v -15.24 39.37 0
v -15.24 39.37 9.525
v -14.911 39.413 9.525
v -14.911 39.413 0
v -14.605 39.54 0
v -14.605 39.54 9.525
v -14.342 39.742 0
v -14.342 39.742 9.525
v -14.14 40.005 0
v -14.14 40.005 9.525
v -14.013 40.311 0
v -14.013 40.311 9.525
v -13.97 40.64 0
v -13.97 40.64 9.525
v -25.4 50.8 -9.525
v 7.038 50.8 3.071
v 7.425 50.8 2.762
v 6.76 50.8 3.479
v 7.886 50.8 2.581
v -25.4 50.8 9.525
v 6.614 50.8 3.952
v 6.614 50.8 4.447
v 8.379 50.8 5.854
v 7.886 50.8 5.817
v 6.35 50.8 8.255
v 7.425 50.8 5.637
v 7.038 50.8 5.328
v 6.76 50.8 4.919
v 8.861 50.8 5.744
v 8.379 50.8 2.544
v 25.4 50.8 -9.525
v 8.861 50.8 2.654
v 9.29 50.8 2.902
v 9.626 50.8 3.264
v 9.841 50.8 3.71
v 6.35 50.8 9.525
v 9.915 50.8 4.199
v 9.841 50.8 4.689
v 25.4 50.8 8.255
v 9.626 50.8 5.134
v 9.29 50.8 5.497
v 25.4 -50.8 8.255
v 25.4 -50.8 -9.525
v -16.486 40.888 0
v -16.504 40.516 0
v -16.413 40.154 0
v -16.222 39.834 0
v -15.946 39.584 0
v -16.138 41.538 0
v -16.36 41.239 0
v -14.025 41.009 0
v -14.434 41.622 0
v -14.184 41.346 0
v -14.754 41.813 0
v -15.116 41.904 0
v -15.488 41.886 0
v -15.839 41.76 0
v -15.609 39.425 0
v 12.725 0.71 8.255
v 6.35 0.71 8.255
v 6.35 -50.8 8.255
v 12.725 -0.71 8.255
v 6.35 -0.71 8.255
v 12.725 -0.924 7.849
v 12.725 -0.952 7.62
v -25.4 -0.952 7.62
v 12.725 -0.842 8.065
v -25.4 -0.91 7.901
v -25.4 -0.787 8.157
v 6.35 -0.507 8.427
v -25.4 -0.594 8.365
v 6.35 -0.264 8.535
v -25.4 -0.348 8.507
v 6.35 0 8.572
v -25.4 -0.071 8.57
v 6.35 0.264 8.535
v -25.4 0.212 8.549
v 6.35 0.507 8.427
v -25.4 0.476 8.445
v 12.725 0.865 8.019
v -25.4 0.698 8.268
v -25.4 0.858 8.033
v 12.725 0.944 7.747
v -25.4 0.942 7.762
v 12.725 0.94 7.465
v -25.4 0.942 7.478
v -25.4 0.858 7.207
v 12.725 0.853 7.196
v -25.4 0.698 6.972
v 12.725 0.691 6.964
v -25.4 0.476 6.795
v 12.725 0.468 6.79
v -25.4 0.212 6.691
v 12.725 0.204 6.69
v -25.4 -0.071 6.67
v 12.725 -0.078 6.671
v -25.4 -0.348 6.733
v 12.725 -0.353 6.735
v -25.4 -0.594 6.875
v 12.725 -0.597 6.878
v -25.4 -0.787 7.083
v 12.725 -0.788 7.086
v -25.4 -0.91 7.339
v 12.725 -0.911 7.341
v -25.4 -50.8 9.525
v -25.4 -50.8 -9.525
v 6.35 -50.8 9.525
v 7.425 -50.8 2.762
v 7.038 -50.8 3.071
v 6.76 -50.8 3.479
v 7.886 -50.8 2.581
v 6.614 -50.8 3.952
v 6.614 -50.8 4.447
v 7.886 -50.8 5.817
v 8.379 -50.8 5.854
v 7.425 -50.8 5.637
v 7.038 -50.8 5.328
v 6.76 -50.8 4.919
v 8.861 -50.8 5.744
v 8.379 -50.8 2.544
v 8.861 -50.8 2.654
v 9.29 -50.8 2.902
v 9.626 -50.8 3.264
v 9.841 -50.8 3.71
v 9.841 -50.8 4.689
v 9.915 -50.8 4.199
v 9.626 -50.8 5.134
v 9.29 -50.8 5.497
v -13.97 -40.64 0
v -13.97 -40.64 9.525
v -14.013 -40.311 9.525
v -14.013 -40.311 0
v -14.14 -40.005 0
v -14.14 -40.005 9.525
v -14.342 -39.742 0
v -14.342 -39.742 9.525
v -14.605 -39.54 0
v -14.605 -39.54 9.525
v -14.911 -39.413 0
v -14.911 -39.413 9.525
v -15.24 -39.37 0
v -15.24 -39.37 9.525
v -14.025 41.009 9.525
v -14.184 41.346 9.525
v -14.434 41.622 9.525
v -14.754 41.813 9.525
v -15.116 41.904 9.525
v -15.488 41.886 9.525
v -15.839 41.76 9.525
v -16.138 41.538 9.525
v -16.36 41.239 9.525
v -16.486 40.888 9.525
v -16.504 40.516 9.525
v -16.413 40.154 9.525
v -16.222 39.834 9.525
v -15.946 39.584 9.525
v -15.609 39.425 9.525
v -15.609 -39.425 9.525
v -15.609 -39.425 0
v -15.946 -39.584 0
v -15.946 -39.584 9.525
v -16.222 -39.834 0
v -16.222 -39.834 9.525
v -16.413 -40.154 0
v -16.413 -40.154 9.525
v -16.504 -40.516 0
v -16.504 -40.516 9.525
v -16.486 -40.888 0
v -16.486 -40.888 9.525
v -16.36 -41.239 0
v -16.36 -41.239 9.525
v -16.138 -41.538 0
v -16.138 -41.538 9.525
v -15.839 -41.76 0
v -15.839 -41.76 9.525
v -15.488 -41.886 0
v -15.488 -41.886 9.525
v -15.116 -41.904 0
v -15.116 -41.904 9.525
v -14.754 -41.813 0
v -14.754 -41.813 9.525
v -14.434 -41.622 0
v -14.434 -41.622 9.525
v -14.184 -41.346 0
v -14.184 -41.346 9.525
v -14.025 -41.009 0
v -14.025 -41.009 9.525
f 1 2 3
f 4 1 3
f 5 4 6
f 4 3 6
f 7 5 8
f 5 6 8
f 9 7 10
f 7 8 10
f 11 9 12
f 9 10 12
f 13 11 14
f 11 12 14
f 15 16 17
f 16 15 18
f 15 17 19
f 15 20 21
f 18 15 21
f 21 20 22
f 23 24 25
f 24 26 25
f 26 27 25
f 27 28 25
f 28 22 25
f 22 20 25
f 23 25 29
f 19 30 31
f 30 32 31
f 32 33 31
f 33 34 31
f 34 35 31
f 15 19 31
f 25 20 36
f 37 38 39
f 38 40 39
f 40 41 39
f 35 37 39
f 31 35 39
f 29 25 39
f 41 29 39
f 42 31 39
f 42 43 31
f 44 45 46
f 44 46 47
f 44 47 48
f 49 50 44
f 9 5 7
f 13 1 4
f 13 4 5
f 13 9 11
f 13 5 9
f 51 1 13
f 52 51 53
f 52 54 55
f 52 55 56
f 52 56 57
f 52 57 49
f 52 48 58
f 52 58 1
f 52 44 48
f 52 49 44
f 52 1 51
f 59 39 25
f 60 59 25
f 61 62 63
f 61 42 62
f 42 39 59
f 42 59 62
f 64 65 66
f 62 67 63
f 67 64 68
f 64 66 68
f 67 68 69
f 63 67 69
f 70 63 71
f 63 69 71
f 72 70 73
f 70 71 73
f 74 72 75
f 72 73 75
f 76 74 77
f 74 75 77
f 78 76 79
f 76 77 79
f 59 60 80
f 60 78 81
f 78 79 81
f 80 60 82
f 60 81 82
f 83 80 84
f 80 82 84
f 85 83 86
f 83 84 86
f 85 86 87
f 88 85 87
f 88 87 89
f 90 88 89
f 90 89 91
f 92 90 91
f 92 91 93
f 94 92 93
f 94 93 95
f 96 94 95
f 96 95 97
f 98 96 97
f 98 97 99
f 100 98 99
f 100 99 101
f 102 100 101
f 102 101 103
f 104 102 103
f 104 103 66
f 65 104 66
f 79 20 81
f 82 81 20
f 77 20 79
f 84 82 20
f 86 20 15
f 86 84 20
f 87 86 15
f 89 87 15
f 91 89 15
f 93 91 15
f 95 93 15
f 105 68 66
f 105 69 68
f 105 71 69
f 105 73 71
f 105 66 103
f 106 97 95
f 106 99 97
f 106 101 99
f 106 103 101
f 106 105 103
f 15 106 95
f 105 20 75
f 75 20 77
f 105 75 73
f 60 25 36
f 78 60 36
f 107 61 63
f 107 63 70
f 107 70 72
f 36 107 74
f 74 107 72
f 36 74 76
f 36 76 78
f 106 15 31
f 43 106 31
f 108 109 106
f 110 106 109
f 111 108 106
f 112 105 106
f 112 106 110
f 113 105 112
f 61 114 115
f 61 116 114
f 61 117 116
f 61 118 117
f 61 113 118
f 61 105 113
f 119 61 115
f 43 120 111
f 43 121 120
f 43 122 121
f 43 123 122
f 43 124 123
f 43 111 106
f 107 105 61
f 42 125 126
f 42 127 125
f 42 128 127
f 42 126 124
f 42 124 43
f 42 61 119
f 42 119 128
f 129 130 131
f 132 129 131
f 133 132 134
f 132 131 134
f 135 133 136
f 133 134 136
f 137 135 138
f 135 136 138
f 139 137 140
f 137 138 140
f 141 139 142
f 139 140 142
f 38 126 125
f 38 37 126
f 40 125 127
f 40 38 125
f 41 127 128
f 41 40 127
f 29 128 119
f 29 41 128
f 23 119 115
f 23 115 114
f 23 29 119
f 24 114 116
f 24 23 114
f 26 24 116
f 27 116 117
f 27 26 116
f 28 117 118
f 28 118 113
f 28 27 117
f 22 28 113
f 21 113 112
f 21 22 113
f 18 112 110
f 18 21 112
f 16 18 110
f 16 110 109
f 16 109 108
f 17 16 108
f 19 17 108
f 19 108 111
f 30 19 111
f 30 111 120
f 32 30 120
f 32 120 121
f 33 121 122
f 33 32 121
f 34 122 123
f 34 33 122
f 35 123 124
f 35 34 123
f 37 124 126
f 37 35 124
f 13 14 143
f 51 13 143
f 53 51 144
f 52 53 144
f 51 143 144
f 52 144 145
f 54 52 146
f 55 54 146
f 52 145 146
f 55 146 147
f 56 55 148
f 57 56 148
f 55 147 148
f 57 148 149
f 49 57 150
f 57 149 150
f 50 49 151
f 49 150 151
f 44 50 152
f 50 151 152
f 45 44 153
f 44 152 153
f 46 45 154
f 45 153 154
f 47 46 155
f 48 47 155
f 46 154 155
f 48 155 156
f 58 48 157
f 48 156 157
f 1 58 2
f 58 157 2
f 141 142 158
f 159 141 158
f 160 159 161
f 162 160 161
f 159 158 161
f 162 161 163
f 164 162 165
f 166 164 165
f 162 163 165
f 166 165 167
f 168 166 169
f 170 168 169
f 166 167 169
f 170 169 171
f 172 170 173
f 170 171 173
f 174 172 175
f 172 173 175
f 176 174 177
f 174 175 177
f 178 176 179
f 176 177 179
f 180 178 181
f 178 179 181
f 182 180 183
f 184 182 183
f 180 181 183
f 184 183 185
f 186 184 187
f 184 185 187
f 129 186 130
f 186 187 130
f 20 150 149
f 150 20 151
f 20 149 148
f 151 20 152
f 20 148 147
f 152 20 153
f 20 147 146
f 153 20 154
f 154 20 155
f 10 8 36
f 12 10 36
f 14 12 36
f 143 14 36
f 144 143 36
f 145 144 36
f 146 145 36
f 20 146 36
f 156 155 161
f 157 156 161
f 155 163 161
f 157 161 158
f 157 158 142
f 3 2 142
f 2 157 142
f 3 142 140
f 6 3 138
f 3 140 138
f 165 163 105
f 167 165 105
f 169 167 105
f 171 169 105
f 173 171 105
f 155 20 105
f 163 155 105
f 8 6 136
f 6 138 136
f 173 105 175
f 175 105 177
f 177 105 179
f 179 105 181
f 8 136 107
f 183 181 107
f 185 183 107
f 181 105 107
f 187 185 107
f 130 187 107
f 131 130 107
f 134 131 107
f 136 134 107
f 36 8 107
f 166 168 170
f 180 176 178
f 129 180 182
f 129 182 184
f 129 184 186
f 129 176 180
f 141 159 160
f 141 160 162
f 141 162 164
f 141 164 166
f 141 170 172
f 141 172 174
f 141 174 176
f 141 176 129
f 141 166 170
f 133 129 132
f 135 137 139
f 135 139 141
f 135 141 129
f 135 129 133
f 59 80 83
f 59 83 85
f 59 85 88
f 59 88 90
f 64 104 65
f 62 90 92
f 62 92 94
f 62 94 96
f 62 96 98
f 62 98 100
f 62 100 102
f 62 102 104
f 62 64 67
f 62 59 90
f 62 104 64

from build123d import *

# Parameters (mm, degrees)
F0_R     = 1.659583
F0_W     = 31.75
F0_H     = 1.27
F1_DEPTH = 50.8
F2_R     = 0.9525
F3_DEPTH = 38.1254
F5_DEPTH = 9.525


with BuildPart() as f1:
    # F0 (on Front) → F1 (new body, symmetric)
    with BuildSketch(Plane.XZ):
        Polygon((25.4, -9.525), (25.4, 8.255), (12.7, 8.255), (12.7, 6.985), (-25.4, 6.985), (-25.4, -9.525), align=None)
        with Locations((8.255, 4.199334)):
            Circle(F0_R, mode=Mode.SUBTRACT)
        Polygon((12.7, 8.255), (6.35, 8.255), (-25.4, 8.255), (-25.4, 6.985), (12.7, 6.985), align=None)
        with Locations((-9.525, 8.89)):
            Rectangle(F0_W, F0_H)
    extrude(amount=F1_DEPTH, both=True)

    # F2 (on face) → F3 (cut)
    with BuildSketch(Plane(origin=(-25.4, 0, 0), x_dir=(0, -1, 0), z_dir=(-1, 0, 0))):
        with Locations((0, 7.62)):
            Circle(F2_R)
    extrude(amount=-F3_DEPTH, mode=Mode.SUBTRACT)

    # F4 (on face) → F5 (cut)
    with BuildSketch(Plane.XY.offset(9.525)):
        with BuildLine():
            ThreePointArc((-13.97, 40.64), (-16.138026, 41.538026), (-15.24, 39.37))
            ThreePointArc((-15.24, 39.37), (-14.341974, 39.741974), (-13.97, 40.64))
        make_face()
        with BuildLine():
            ThreePointArc((-13.97, -40.64), (-14.341974, -39.741974), (-15.24, -39.37))
            ThreePointArc((-15.24, -39.37), (-16.138026, -41.538026), (-13.97, -40.64))
        make_face()
    extrude(amount=-F5_DEPTH, mode=Mode.SUBTRACT)


solid = f1.part
